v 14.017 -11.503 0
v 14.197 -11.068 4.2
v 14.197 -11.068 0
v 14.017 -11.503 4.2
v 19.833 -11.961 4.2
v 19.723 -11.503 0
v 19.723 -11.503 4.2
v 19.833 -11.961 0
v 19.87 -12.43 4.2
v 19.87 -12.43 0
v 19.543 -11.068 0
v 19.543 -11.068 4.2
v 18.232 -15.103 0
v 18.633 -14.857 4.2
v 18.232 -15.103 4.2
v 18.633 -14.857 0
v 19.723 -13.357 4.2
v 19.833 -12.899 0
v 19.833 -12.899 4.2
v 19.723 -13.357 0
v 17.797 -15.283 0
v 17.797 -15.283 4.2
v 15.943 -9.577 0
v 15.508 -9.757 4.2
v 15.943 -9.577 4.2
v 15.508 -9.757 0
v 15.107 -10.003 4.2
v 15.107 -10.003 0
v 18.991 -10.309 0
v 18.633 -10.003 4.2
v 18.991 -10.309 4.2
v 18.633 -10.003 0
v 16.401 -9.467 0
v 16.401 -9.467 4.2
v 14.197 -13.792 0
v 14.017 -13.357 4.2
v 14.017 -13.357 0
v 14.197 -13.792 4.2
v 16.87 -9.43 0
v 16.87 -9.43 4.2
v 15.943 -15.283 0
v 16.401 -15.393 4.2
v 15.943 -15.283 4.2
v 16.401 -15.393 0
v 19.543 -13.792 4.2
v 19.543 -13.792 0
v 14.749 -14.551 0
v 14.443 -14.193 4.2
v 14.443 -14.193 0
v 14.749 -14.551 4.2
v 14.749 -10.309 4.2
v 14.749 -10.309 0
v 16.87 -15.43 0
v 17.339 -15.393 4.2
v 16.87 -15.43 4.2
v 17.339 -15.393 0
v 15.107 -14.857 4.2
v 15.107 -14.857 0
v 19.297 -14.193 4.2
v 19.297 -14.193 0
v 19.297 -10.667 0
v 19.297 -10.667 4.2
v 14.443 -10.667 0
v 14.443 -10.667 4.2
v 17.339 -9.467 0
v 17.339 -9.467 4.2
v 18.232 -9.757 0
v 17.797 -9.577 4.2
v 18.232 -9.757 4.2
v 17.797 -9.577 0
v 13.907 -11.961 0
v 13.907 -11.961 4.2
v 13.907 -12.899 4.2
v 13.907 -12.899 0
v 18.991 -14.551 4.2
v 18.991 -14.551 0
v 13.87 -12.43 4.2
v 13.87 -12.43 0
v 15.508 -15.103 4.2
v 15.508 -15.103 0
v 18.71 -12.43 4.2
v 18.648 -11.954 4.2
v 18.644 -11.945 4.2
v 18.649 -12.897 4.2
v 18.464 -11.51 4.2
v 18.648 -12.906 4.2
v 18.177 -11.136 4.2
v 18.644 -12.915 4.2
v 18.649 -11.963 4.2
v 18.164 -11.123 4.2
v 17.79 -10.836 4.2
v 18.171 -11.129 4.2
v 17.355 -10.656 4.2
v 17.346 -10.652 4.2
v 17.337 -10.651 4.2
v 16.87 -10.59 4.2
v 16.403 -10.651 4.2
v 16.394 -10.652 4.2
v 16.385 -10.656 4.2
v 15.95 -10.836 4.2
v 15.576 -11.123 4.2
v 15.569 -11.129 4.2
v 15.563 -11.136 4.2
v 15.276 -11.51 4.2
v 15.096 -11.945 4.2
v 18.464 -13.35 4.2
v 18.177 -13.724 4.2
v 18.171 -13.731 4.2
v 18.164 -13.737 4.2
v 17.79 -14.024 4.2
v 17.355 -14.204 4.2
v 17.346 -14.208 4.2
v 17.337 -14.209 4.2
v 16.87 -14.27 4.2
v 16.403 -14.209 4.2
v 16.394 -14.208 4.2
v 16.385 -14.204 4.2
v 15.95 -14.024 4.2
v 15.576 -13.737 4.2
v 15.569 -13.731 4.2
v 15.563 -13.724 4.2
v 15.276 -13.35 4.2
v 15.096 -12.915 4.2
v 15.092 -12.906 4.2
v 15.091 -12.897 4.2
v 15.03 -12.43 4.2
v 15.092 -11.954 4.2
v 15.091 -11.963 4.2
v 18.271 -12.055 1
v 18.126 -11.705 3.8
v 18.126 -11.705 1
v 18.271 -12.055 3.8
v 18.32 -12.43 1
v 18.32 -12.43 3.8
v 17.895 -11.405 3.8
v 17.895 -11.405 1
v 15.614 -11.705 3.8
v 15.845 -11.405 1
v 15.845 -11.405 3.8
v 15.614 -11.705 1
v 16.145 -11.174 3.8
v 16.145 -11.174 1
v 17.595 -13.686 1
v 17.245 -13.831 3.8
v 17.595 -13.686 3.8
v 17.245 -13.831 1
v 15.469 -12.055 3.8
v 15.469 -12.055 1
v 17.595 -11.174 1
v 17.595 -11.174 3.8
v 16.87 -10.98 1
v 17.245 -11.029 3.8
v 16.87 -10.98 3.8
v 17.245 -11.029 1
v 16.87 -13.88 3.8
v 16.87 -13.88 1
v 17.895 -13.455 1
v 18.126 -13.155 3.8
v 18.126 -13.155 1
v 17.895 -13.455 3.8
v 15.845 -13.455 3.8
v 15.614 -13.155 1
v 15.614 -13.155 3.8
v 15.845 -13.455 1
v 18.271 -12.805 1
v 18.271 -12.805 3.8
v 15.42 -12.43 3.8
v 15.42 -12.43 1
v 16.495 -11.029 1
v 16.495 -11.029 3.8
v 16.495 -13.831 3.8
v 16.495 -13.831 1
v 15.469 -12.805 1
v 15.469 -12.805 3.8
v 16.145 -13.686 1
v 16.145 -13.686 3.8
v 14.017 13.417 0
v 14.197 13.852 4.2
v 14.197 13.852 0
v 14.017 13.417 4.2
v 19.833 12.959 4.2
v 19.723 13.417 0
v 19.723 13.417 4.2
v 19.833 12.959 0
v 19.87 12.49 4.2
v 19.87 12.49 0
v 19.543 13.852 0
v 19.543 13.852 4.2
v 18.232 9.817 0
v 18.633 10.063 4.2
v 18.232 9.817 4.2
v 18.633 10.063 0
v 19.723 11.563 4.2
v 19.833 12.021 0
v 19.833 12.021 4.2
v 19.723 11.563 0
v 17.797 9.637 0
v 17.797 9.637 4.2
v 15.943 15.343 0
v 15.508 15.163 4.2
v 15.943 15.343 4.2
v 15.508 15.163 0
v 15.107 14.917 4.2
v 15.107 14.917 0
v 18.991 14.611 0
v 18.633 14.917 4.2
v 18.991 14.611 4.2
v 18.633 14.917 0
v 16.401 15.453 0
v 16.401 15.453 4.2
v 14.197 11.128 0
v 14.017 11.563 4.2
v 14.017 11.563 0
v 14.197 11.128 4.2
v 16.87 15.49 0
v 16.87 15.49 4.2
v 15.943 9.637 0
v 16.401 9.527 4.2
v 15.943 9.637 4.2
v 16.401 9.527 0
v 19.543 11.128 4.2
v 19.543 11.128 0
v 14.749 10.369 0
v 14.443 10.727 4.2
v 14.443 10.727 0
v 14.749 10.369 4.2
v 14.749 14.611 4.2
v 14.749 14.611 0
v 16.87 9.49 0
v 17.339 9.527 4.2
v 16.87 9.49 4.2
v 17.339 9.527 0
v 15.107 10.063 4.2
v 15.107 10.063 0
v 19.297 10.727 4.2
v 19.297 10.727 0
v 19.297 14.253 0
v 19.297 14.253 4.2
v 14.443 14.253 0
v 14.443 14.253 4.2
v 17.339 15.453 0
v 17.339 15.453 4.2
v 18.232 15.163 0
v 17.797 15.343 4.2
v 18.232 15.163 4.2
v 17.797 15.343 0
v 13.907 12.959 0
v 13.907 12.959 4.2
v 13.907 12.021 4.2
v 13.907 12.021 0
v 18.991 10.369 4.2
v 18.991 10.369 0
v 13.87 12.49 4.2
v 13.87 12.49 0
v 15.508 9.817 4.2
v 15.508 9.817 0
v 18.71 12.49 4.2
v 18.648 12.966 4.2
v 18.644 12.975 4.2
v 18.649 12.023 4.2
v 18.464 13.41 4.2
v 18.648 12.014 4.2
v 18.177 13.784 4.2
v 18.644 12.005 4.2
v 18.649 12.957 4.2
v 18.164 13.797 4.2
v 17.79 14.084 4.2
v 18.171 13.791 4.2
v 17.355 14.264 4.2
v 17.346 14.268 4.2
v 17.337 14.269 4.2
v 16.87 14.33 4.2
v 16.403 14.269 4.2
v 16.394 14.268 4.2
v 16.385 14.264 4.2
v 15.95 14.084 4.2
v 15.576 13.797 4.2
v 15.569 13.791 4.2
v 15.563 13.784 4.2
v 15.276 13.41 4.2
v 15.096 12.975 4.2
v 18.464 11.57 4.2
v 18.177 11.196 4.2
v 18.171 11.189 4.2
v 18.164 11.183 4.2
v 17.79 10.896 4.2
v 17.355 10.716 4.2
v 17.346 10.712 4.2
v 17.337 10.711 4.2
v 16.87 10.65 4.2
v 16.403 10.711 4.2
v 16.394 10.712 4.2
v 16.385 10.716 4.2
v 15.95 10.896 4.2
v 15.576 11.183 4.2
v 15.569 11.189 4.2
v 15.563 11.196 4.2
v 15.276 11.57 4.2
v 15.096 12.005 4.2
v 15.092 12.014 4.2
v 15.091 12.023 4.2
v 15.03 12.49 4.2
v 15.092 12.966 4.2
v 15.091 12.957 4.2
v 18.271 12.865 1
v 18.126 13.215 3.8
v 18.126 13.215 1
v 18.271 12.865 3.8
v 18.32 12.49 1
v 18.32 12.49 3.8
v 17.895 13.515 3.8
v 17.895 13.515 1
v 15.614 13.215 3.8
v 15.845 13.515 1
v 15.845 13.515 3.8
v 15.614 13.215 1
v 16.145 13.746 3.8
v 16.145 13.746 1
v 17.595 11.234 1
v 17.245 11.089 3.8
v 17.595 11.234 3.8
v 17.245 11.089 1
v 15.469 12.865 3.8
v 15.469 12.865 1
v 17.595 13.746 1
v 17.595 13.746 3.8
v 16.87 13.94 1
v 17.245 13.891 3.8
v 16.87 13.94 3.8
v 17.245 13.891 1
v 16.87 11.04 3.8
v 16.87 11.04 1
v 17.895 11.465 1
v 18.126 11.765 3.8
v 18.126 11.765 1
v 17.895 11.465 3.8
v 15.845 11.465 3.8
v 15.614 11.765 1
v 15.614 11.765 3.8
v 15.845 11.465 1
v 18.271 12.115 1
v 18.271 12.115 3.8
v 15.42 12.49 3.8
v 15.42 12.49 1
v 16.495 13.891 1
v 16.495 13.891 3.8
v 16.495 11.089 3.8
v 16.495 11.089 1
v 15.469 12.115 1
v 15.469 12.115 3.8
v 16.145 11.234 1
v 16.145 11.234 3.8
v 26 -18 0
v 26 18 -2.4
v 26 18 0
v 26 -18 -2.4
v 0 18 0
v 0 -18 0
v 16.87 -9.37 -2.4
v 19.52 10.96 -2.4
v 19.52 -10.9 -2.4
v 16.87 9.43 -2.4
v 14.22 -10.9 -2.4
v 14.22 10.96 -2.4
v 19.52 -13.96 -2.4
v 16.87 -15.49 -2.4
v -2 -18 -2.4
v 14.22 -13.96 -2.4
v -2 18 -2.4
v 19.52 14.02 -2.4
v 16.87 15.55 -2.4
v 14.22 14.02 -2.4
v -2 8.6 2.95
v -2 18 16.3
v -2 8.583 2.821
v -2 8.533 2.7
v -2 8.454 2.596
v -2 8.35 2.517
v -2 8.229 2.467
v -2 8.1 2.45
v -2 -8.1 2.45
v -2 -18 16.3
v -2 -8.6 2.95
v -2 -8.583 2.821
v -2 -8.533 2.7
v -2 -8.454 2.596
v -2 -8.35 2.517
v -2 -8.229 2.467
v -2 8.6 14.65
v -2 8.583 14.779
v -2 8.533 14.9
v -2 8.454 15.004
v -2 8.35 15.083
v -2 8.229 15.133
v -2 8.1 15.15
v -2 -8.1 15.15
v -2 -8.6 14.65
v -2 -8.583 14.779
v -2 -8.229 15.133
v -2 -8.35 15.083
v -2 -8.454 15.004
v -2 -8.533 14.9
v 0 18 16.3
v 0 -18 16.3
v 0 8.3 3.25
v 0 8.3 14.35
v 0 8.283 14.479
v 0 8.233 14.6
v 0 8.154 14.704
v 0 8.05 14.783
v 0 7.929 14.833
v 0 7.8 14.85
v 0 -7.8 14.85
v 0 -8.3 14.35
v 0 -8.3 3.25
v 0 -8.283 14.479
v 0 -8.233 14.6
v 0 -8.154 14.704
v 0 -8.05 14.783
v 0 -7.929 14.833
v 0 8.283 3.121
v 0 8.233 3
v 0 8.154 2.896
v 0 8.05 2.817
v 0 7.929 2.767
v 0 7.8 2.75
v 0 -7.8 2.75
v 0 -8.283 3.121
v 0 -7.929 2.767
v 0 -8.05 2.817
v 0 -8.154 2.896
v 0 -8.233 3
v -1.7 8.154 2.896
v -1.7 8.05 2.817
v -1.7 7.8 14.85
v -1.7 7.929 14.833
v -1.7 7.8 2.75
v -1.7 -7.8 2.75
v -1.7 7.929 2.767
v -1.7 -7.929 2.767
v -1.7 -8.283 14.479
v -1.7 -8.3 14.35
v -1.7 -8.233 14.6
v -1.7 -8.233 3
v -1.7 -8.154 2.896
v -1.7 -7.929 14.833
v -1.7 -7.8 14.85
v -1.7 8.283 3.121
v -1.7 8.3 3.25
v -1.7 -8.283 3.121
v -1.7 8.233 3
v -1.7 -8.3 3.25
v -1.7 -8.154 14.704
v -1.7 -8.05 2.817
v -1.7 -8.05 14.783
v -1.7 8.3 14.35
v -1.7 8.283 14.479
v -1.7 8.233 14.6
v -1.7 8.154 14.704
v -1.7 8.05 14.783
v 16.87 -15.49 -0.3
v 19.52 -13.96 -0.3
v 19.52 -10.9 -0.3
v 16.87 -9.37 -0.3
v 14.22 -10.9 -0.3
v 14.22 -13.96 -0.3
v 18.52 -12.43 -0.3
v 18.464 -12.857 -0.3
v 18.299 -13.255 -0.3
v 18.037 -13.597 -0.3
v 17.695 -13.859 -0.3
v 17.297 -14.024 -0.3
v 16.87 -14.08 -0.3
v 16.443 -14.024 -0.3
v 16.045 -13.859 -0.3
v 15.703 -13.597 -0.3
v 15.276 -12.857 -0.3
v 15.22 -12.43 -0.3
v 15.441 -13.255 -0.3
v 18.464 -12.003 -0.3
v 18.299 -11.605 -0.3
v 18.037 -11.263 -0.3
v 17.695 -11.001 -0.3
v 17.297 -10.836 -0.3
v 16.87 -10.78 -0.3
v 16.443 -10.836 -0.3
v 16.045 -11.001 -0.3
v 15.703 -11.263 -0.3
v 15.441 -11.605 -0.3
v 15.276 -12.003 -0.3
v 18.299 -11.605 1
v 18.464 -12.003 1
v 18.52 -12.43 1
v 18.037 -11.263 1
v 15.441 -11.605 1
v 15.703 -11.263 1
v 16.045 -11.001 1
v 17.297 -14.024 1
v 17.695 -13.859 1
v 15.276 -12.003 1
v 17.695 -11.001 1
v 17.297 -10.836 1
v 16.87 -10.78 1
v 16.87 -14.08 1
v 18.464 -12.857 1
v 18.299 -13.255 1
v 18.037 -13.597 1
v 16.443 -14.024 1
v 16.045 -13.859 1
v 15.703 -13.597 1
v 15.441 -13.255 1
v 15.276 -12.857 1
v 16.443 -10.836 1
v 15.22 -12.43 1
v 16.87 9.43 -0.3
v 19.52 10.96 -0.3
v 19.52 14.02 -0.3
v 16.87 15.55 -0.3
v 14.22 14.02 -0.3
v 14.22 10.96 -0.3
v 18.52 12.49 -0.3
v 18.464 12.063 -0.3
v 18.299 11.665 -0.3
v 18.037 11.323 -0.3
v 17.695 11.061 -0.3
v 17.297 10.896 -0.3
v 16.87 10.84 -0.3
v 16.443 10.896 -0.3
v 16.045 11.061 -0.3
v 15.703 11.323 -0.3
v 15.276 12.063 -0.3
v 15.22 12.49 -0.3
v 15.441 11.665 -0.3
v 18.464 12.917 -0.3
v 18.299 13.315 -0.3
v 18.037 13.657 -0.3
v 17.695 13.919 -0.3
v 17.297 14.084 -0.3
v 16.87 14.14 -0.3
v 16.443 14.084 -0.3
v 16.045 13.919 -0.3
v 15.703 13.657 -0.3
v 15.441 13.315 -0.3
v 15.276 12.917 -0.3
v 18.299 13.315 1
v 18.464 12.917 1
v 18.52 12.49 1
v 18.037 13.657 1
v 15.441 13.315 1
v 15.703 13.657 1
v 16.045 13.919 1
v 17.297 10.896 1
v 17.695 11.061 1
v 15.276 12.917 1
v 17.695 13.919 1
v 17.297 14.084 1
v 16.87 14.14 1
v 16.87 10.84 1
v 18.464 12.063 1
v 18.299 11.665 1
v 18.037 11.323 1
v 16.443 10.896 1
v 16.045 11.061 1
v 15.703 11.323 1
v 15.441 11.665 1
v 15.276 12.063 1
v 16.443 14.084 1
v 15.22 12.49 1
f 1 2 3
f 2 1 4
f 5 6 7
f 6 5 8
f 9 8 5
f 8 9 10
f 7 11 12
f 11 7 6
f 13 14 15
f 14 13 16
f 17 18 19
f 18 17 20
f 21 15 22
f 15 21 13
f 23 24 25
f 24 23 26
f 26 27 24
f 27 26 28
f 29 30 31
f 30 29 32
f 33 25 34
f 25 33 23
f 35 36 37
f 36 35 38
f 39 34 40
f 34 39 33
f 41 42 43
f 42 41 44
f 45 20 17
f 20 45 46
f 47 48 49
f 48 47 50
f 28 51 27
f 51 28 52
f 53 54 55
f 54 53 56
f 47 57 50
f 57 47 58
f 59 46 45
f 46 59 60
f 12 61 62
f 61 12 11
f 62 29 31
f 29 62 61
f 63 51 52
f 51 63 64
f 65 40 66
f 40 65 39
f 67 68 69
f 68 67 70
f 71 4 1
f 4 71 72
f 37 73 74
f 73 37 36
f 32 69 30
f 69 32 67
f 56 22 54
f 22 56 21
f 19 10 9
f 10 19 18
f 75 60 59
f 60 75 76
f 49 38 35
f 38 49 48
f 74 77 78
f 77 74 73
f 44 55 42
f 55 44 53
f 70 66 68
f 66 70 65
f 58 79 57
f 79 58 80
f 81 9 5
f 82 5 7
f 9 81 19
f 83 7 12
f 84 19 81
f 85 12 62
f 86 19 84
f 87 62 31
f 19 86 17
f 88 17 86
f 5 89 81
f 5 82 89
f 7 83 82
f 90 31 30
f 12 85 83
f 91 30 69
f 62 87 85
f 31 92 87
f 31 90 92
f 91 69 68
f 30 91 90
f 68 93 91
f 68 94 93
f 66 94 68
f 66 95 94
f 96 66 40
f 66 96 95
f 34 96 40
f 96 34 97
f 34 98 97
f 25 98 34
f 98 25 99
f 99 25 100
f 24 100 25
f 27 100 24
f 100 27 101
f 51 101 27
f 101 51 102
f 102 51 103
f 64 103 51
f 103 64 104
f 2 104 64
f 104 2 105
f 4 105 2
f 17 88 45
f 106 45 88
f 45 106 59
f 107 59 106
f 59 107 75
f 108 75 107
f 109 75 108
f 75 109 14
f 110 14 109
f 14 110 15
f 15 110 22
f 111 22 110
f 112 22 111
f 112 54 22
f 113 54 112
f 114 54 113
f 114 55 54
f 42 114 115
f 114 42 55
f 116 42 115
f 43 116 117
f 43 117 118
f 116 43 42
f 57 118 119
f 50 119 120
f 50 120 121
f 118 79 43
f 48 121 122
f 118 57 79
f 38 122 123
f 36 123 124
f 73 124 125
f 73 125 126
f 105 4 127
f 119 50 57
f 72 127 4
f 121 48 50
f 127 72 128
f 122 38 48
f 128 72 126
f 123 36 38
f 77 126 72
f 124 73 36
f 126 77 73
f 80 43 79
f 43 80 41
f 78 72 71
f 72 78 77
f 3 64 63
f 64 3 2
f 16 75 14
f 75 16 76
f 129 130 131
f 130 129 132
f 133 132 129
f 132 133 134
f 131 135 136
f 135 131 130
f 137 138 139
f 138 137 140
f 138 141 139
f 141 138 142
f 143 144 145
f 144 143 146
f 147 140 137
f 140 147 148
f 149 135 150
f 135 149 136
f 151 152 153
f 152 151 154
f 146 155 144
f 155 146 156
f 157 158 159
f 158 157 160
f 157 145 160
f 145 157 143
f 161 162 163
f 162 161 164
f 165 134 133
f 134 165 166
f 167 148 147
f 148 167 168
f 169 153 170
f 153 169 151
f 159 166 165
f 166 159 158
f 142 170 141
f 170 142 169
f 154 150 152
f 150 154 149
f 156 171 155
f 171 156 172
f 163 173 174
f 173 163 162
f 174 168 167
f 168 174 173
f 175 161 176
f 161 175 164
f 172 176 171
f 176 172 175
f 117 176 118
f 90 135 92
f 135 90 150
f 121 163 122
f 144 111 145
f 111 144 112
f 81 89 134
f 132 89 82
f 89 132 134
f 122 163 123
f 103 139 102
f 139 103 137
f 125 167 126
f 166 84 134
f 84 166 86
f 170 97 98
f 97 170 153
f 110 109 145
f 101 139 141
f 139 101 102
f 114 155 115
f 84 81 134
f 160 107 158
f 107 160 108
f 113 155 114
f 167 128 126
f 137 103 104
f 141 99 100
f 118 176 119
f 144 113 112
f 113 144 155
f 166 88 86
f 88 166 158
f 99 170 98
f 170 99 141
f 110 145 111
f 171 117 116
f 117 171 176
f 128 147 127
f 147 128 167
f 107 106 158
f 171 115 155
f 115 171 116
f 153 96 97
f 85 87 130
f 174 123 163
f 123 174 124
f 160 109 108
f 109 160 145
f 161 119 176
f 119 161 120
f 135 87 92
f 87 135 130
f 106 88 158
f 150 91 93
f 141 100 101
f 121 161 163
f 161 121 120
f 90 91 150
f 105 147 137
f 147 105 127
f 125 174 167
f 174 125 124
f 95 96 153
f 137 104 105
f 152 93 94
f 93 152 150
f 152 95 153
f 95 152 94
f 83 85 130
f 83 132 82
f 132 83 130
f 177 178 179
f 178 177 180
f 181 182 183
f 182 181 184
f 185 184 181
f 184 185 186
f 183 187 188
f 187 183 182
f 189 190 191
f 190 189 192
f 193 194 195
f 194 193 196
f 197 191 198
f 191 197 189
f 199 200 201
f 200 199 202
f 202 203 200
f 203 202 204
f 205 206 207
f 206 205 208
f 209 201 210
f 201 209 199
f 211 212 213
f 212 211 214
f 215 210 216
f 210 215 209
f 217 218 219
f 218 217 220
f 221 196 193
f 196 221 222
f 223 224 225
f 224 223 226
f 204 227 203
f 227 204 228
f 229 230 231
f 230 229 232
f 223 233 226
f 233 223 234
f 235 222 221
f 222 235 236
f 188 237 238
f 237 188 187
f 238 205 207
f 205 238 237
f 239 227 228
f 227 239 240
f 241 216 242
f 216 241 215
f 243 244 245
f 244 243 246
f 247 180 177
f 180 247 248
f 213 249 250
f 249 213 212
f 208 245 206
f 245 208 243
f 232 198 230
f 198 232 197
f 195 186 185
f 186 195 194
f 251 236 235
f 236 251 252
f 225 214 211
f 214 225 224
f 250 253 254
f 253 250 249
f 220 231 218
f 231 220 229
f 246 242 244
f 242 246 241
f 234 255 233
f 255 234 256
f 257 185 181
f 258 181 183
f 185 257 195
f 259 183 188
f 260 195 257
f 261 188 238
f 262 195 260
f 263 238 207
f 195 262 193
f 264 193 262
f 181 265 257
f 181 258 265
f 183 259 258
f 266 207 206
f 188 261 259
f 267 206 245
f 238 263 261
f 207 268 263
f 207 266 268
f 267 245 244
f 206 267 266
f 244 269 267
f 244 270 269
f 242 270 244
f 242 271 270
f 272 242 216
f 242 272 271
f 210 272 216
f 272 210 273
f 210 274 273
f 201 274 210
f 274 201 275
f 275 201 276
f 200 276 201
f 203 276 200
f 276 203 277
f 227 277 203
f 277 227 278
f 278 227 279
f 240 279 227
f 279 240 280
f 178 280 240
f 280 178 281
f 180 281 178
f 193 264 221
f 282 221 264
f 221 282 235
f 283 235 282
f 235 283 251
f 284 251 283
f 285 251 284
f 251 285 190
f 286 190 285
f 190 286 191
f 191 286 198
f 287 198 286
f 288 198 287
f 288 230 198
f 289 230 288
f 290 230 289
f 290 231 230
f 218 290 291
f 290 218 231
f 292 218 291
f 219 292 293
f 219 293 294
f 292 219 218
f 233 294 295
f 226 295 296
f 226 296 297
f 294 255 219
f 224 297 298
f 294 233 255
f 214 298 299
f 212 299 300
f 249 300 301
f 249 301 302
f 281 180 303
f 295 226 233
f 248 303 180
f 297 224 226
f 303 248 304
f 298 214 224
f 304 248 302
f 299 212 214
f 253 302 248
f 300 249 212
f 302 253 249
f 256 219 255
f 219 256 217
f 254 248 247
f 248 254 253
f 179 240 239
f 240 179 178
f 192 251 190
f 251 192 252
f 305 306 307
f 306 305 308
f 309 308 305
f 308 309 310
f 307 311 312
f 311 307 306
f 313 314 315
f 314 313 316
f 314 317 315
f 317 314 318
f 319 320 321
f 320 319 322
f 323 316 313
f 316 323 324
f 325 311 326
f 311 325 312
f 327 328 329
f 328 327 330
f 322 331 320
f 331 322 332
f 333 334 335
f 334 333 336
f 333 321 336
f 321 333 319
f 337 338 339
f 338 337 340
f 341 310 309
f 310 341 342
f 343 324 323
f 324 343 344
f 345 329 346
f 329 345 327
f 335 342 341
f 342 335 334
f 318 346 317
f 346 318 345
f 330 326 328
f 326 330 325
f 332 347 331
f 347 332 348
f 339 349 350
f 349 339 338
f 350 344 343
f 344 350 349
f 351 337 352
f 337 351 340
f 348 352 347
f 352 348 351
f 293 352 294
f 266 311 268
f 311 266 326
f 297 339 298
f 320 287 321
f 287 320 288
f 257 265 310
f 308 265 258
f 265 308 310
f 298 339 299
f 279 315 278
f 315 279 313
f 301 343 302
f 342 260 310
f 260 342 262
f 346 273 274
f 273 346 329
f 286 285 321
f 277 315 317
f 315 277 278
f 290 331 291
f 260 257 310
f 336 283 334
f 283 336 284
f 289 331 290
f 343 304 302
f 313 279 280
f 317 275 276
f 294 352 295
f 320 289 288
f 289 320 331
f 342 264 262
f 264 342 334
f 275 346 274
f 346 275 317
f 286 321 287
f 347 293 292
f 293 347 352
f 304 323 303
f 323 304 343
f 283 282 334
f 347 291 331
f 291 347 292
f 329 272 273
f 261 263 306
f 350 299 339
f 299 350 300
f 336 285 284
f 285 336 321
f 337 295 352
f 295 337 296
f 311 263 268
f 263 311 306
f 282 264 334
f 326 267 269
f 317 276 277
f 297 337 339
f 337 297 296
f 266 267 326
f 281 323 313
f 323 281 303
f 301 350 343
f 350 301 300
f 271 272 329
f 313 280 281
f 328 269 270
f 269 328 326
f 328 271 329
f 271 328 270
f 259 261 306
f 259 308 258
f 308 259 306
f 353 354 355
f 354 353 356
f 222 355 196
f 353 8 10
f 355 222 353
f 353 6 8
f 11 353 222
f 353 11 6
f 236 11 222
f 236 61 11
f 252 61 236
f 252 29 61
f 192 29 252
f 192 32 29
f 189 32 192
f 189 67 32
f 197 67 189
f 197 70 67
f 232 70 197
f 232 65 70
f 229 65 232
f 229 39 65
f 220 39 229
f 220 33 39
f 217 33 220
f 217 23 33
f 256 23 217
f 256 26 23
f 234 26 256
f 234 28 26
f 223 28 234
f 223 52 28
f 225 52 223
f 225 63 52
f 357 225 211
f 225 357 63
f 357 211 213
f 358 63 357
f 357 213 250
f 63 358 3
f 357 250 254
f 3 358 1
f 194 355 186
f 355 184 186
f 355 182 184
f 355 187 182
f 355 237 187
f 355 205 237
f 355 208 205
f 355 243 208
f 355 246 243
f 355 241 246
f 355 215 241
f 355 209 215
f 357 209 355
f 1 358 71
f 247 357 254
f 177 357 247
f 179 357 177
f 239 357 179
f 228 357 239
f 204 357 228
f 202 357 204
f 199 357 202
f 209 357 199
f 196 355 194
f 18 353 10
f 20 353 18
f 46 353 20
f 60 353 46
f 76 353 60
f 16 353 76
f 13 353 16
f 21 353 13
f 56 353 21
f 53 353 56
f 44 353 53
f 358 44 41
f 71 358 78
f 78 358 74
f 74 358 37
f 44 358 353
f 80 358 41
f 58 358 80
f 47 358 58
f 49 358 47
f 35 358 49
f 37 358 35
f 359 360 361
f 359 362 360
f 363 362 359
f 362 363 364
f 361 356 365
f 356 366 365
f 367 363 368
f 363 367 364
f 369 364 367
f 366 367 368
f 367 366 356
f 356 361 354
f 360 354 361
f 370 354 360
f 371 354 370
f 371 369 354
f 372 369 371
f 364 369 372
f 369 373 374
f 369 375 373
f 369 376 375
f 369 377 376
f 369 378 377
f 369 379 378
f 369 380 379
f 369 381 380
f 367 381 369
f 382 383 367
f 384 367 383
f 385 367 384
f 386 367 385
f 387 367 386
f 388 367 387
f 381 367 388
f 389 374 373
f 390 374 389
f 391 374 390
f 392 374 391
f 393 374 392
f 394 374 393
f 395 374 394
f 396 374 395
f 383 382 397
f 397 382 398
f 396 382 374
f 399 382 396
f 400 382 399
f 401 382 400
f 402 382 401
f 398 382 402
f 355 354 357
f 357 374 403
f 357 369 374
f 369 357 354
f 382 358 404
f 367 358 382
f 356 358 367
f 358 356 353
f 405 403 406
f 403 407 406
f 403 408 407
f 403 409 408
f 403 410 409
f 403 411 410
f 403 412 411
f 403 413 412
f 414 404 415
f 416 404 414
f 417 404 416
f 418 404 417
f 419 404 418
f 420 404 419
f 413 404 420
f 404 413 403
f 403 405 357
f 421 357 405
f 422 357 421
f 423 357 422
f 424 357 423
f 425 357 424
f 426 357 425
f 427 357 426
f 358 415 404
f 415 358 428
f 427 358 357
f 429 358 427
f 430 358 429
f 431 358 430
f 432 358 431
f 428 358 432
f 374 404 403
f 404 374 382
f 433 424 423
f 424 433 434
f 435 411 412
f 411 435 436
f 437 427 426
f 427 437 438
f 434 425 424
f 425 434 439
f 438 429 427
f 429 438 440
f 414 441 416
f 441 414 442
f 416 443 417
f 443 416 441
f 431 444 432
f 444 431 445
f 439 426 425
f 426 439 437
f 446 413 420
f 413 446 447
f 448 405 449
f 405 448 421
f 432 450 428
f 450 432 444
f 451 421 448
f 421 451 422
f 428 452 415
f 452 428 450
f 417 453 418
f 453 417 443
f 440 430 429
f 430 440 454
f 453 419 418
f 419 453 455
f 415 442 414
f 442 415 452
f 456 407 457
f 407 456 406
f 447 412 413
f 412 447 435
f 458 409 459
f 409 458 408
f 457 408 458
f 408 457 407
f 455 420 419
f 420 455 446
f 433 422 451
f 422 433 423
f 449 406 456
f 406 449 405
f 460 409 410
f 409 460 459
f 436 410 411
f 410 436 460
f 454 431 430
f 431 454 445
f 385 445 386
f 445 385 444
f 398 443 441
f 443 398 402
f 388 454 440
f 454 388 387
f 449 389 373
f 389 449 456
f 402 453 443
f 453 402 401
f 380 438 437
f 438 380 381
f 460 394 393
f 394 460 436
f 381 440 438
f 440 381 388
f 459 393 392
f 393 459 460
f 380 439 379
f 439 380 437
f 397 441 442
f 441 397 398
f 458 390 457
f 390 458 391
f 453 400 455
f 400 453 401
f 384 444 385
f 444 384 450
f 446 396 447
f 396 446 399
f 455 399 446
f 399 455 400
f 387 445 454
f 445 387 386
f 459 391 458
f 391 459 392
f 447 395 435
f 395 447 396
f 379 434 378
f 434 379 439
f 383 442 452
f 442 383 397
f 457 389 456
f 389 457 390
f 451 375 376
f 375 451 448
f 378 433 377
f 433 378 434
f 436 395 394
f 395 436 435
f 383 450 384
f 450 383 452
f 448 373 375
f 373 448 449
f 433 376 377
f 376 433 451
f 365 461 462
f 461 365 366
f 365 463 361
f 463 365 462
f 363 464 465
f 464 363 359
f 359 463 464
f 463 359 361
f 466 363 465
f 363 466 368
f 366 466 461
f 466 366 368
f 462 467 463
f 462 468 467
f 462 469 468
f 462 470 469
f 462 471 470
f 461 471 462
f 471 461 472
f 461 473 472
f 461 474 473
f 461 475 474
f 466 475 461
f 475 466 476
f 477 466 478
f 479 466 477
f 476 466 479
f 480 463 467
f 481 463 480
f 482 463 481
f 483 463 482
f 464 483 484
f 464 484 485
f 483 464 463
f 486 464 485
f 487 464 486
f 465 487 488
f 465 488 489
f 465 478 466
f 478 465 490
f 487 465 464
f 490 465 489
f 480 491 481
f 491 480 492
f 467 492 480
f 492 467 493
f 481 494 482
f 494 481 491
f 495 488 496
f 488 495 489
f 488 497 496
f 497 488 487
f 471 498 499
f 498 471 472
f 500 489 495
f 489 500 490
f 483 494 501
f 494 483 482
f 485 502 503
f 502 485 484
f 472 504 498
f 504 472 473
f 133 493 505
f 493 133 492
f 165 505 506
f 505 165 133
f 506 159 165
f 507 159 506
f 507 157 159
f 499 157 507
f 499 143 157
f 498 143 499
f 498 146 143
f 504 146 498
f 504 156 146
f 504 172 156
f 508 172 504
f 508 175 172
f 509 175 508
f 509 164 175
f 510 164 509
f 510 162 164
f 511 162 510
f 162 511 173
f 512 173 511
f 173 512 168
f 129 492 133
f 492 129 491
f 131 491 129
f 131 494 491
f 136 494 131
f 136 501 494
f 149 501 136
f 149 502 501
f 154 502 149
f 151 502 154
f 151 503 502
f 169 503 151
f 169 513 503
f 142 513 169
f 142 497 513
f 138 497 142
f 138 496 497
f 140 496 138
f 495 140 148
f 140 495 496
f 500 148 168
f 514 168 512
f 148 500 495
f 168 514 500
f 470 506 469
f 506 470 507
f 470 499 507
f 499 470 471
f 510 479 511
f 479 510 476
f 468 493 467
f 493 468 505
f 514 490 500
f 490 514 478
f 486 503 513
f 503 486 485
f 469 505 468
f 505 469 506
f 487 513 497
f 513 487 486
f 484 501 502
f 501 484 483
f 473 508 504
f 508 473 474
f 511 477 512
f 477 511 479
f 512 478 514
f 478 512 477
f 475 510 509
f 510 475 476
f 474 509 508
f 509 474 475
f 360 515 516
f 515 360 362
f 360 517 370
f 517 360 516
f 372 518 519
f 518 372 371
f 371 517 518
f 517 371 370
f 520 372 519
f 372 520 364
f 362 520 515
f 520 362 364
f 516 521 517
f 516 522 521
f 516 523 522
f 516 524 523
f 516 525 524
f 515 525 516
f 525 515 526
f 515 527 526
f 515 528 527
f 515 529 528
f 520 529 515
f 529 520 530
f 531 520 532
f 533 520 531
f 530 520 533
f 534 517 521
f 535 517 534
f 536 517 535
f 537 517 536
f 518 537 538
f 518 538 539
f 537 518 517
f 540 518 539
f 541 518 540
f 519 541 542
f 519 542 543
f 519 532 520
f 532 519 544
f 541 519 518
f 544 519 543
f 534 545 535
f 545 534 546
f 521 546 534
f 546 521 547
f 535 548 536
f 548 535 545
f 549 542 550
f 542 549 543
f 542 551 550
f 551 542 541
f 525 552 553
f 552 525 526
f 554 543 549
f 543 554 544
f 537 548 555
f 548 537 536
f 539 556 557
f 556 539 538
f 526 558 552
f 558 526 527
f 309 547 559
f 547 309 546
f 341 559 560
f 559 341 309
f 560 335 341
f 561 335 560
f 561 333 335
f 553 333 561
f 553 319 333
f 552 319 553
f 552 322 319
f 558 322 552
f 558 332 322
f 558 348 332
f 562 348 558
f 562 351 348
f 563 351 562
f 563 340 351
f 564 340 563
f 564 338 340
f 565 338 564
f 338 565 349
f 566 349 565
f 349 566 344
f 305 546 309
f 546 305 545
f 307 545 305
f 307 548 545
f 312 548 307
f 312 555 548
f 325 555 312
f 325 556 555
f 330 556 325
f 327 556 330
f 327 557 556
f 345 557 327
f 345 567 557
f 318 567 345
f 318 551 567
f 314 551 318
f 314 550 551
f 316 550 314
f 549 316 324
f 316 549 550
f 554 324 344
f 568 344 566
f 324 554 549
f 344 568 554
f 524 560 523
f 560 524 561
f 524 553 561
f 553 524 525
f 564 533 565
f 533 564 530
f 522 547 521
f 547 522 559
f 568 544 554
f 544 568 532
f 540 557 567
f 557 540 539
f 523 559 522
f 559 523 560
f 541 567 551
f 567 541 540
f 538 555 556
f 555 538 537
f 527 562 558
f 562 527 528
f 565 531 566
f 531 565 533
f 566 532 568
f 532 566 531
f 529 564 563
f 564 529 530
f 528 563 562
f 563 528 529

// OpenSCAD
// file: ../../screw-post/screw-post.scad
//-----------------------------------------------------------------------
// Screw post: a round post off the floor that a board screws down onto
//
// Two ways to fix:
//   "nut"  clearance hole through the post and floor; the nut sits in a hex
//          trap in the floor's underside, so the screw goes in from the top
//   "tap"  a pilot hole the screw cuts its own thread in (one or two fittings
//          in PLA/PETG); blind, the floor stays whole underneath
// and "head" for a screw up from below (head in a counterbore, nut on top).
//
// Modules, all in the same frame:
//   screwPostGhost()     the screw (and nut), for previews
//   screwPost()          the post: add to the floor
//   screwPostFloorCut()  subtract from the floor: nut trap / counterbore and hole
//
// Frame: origin on the floor top, on the post's axis. Z up; the floor is
// Z = -floorThick .. 0. Units: mm.
//
// Sizes: "M2", "M2.5", "M3". screwPostScrew(size, ...) says which screw length
// reaches, so a project can assert it has that screw in the kit.
//-----------------------------------------------------------------------

//-- [name, screw Ø, nut across flats, nut thick, head Ø, head height, tap hole, post Ø]
//-- Nuts ISO 4032; heads ISO 7380 button. Tap holes: the usual ~0.8 x Ø for plastic
screwSizes = [
  ["M2",   2.0, 4.0, 1.6, 3.5, 1.1, 1.6, 5.0],
  ["M2.5", 2.5, 5.0, 2.0, 4.4, 1.4, 2.1, 6.0],    // head 4.4: measured on the kit's M2.5 (controller base)
  ["M3",   3.0, 5.5, 2.4, 5.7, 1.65, 2.5, 7.0],
];

screwHoleClear = 0.4;     // added to the screw Ø for a clearance hole
screwNutClear  = 0.3;     // CAL: across flats, nut trap over the nut. Set by the fit piece
screwTapClear  = 0.0;     // CAL: added to the tap hole. Set by the fit piece
screwHeadClear = 0.6;     // counterbore over the head Ø

function screwSize(size) = let (i = search([size], screwSizes)[0])
  assert(i != [] && i != undef, str("unknown screw size ", size)) screwSizes[i];
function screwDia(size)    = screwSize(size)[1];
function screwNutAF(size)  = screwSize(size)[2];
function screwNutH(size)   = screwSize(size)[3];
function screwHeadDia(size)= screwSize(size)[4];
function screwHeadH(size)  = screwSize(size)[5];
function screwPostDia(size)= screwSize(size)[7];

//-- Shortest screw that fills the nut, from the top of the clamped part (h + clamp
//-- above the floor) down to the nut trap's underside. Round up to a length you have.
function screwPostScrew(size, h, floorThick, clamp = 1.6) = h + clamp + floorThick;

module screwPostGhost(size, h, floorThick, clamp = 1.6, length, how = "nut")
{
  d = screwDia(size);
  L = is_undef(length) ? screwPostScrew(size, h, floorThick, clamp) : length;
  top = h + clamp;
  if (how == "head")
  {
    %color("Silver") translate([0, 0, -floorThick]) cylinder(d = screwHeadDia(size), h = screwHeadH(size), $fn = 24);
    %color("Silver") translate([0, 0, -floorThick + screwHeadH(size)]) cylinder(d = d, h = L, $fn = 16);
  }
  else
  {
    %color("Silver") translate([0, 0, top]) cylinder(d = screwHeadDia(size), h = screwHeadH(size), $fn = 24);
    %color("Silver") translate([0, 0, top - L]) cylinder(d = d, h = L, $fn = 16);
    if (how == "nut")
      %color("DimGray") translate([0, 0, -floorThick]) rotate([0, 0, 30]) cylinder(d = screwNutAF(size)/cos(30), h = screwNutH(size), $fn = 6);
  }
}

//-- how: "nut" | "head" (through hole) or "tap" (blind pilot hole). postDia defaults by size
module screwPost(size, h, how = "nut", postDia, tapClear = screwTapClear)
{
  pd = is_undef(postDia) ? screwPostDia(size) : postDia;
  hole = how == "tap" ? screwSize(size)[6] + tapClear : screwDia(size) + screwHoleClear;
  difference()
  {
    translate([0, 0, -0.01]) cylinder(d = pd, h = h + 0.01, $fn = 40);
    translate([0, 0, how == "tap" ? 0.6 : -1]) cylinder(d = hole, h = h + 2, $fn = 24);
    //-- lead-in so the screw starts square
    translate([0, 0, h - 0.4]) cylinder(d1 = hole, d2 = hole + 0.8, h = 0.41, $fn = 24);
  }
}

//-- "nut": hex trap from the underside, opening a little over the nut so it sits flush.
//-- "head": counterbore for the head. "tap": nothing.
module screwPostFloorCut(size, floorThick, how = "nut", nutClear = screwNutClear)
{
  d = screwDia(size) + screwHoleClear;
  if (how == "nut")
  {
    af = screwNutAF(size) + nutClear;
    translate([0, 0, -floorThick - 1]) rotate([0, 0, 30]) cylinder(d = af/cos(30), h = screwNutH(size) + 0.1 + 1, $fn = 6);
    translate([0, 0, -floorThick - 1]) cylinder(d = d + 0.4, h = floorThick + 2, $fn = 24);
  }
  if (how == "head")
  {
    translate([0, 0, -floorThick - 1]) cylinder(d = screwHeadDia(size) + screwHeadClear, h = screwHeadH(size) + 0.2 + 1, $fn = 32);
    translate([0, 0, -floorThick - 1]) cylinder(d = d + 0.4, h = floorThick + 2, $fn = 24);
  }
  assert(how == "tap" || floorThick >= (how == "nut" ? screwNutH(size) : screwHeadH(size)) + 0.1 + 0.3,
         str("floor too thin for the ", size, " ", how));
}
// main file
// One breakout station: a piece of wall and floor with the jack pocket and two posts, for the catalogue.
use <../rj45-breakout.scad>

board = "pihut-106592"; wall = 2.0; postH = 4.2; floorThick = 2.4; clearance = 0.3;
wallH = rj45AxisZ(postH, board) + 7.5;
difference()
{
  union()
  {
    translate([-wall, -18, -floorThick]) cube([wall + 26, 36, floorThick]);
    translate([-wall, -18, 0]) cube([wall, 36, wallH]);
    rj45Holder(wall, postH, board);
  }
  rj45WallCut(wall, postH, board, clearance = clearance);
  rj45FloorCut(wall, floorThick, board);
}
